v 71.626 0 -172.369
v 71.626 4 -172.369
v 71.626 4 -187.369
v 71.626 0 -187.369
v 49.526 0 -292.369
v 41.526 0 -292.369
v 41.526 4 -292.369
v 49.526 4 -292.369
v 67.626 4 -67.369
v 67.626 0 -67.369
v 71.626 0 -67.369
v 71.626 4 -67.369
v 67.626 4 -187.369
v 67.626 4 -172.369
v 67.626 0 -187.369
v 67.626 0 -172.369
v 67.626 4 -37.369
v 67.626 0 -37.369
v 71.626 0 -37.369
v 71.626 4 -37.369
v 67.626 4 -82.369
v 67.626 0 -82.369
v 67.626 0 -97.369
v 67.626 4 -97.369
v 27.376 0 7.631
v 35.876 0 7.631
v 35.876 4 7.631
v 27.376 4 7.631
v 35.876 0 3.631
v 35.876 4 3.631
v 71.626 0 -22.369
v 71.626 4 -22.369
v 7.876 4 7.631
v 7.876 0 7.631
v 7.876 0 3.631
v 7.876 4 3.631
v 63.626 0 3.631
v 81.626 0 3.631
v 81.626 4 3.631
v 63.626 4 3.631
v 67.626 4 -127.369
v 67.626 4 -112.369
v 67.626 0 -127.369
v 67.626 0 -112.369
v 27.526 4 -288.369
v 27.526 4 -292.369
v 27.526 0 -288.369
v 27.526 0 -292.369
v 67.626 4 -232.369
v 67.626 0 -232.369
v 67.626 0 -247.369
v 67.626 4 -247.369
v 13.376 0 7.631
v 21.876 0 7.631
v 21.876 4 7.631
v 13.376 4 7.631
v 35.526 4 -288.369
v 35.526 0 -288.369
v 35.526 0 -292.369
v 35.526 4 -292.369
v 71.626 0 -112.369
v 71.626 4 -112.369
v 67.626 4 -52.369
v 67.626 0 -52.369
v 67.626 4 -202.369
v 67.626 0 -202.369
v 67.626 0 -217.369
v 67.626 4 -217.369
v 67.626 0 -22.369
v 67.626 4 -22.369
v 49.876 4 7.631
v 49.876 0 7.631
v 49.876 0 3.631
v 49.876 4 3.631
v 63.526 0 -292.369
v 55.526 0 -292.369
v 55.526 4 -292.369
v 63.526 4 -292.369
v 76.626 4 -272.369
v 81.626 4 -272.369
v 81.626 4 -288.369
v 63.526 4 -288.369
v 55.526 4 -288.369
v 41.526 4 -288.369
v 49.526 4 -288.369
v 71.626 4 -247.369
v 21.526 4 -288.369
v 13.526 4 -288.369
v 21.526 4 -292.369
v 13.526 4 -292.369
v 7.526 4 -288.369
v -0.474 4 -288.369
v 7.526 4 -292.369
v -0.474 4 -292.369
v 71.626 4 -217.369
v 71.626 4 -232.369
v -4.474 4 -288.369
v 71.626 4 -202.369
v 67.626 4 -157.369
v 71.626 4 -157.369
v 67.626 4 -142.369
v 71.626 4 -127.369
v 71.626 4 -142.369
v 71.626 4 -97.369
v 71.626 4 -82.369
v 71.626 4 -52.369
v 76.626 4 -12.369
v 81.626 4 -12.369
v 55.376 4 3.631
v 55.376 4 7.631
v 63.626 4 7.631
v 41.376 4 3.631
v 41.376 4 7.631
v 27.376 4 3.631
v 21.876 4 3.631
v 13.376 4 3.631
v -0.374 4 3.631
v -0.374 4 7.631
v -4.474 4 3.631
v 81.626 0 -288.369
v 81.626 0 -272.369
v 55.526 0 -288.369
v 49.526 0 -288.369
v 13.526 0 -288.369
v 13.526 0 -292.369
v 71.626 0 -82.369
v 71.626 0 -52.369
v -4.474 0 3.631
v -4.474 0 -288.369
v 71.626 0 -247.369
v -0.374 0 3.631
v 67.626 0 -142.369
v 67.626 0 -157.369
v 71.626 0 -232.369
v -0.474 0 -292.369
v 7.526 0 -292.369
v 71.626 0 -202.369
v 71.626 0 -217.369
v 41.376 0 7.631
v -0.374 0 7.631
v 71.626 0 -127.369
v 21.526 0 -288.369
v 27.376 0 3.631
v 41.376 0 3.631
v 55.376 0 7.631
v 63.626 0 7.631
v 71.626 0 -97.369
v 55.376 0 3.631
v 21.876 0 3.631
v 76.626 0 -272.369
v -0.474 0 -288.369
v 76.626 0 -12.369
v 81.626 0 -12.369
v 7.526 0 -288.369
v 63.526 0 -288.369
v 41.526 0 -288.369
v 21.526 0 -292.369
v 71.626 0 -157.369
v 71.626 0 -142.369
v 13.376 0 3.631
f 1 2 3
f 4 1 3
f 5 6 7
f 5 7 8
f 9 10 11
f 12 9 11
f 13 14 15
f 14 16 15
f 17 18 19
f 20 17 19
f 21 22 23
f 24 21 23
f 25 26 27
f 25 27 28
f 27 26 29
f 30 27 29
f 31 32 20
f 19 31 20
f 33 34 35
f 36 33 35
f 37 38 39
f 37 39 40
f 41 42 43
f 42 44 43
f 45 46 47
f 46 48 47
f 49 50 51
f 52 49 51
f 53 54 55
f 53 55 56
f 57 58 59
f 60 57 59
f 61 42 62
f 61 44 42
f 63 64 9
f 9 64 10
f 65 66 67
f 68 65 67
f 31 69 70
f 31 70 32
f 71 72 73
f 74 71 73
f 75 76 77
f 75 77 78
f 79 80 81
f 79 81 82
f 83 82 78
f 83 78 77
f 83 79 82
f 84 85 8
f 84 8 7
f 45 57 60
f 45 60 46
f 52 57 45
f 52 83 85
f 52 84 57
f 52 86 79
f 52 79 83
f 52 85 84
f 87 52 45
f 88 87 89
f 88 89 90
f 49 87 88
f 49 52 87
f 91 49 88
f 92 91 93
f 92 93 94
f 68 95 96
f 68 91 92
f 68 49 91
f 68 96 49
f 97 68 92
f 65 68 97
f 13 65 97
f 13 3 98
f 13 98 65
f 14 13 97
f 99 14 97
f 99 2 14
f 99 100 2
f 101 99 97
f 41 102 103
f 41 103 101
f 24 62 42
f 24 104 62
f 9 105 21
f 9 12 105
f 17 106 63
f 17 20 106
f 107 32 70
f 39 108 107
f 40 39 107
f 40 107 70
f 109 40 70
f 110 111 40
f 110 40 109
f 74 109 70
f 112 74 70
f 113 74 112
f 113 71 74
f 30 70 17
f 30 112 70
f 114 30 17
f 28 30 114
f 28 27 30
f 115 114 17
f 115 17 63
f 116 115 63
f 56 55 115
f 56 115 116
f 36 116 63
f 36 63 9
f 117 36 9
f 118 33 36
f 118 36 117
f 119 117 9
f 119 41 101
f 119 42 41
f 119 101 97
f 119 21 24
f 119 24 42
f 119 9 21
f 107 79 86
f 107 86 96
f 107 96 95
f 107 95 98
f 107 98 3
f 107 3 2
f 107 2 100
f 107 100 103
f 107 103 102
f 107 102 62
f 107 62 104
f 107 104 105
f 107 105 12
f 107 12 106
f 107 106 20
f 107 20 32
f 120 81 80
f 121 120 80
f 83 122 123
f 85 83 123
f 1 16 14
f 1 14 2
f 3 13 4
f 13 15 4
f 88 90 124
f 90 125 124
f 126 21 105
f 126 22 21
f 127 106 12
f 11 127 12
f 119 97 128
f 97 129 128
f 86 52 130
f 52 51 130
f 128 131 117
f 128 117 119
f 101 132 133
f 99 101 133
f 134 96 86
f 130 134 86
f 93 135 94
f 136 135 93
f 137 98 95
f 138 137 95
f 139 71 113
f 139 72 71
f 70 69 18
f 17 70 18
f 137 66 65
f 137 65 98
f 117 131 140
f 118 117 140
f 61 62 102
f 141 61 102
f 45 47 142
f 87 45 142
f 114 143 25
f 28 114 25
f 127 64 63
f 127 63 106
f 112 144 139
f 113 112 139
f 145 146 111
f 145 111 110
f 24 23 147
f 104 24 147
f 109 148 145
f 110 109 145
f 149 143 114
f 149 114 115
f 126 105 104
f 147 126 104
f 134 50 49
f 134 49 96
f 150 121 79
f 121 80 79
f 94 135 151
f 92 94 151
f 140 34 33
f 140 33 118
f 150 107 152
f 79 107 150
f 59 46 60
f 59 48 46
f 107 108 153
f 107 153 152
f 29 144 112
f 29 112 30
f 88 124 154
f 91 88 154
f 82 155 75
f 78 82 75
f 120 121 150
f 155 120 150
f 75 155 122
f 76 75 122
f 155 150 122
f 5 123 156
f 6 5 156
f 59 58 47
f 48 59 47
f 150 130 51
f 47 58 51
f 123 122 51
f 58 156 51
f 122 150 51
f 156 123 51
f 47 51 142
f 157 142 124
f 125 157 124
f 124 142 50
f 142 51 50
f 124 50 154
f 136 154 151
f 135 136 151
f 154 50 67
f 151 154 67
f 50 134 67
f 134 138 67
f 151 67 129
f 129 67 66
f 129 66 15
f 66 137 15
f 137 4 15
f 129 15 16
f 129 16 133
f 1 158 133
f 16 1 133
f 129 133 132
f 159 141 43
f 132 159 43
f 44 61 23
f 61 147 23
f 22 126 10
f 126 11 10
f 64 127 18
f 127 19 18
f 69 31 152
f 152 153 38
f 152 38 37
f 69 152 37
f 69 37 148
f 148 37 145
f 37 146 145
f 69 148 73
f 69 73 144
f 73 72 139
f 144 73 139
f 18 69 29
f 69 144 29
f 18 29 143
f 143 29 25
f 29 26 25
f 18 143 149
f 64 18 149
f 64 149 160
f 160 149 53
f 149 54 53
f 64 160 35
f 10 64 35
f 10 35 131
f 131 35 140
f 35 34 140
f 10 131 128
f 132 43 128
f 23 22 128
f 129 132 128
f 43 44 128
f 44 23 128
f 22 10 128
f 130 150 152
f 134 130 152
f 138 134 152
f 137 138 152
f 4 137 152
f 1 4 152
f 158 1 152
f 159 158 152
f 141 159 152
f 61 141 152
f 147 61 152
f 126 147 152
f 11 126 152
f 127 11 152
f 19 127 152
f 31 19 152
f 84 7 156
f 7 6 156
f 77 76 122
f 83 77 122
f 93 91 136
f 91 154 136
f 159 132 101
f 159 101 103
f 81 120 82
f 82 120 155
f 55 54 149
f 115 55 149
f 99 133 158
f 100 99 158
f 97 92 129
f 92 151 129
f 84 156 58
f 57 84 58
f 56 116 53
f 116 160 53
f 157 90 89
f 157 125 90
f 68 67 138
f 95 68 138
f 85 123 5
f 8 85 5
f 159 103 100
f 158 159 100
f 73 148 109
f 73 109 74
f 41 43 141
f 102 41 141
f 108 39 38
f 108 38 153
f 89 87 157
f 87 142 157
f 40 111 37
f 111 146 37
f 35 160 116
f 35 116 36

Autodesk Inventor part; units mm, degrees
ref_plane "YZ Plane" through (0, 0, 0) normal (1, 0, 0) x (0, 1, 0)
ref_plane "XZ Plane" through (0, 0, 0) normal (0, 1, 0) x (-1, 0, 0)
ref_plane "XY Plane" through (0, 0, 0) normal (0, 0, 1) x (1, 0, 0)
sketch "Sketch1" plane through (0, 0, 0) normal (0, 1, 0) x (-1, 0, 0)
  line L0 (-71.6259, 7.6308) -> (8.4741, 7.6308)
  line L1 (8.4741, 7.6308) -> (8.4741, -292.3692)
  line L2 (8.4741, -292.3692) -> (-71.6259, -292.3692)
  line L3 (-71.6259, -292.3692) -> (-71.6259, 7.6308)
  point P0 (0, 0)
extrude "Extrusion1" add sketch "Sketch1" along normal blind 4
sketch "Sketch2" plane through (0, 0, 0) normal (0, -1, 0) x (1, 0, 0)
  line L0 (-0.3741, 7.6308) -> (-18.4741, 7.6308) construction
  line L1 (-0.3741, 3.6308) -> (-0.3741, 7.6308) construction
  line L2 (7.6259, 7.6308) -> (7.6259, 3.6308) construction
  line L3 (13.6259, 3.6308) -> (7.6259, 3.6308) construction
  line L4 (13.6259, 3.6308) -> (13.6259, 7.6308) construction
  line L5 (21.6259, 7.6308) -> (21.6259, 3.6308) construction
  line L6 (27.6259, 3.6308) -> (21.6259, 3.6308) construction
  line L7 (27.6259, 3.6308) -> (27.6259, 7.6308) construction
  line L8 (35.6259, 7.6308) -> (35.6259, 3.6308) construction
  line L9 (41.6259, 3.6308) -> (35.6259, 3.6308) construction
  line L10 (41.6259, 3.6308) -> (41.6259, 7.6308) construction
  line L11 (49.6259, 7.6308) -> (49.6259, 3.6308) construction
  line L12 (55.6259, 3.6308) -> (49.6259, 3.6308) construction
  line L13 (55.6259, 3.6308) -> (55.6259, 7.6308) construction
  line L14 (63.6259, 7.6308) -> (63.6259, 3.6308) construction
  line L15 (71.6259, 3.6308) -> (63.6259, 3.6308) construction
  line L16 (67.6259, 3.6308) -> (67.6259, -7.3692) projected
  line L17 (67.6259, -7.3692) -> (71.6259, -7.3692) projected
  line L18 (71.6259, 3.6308) -> (71.6259, -7.3692) projected
  line L19 (67.6259, 3.6308) -> (71.6259, 3.6308) projected
  line L20 (67.6259, -22.3692) -> (67.6259, -37.3692) projected
  line L21 (67.6259, -37.3692) -> (71.6259, -37.3692) projected
  line L22 (71.6259, -22.3692) -> (71.6259, -37.3692) projected
  line L23 (67.6259, -22.3692) -> (71.6259, -22.3692) projected
  line L24 (67.6259, -52.3692) -> (67.6259, -67.3692) projected
  line L25 (67.6259, -67.3692) -> (71.6259, -67.3692) projected
  line L26 (71.6259, -52.3692) -> (71.6259, -67.3692) projected
  line L27 (67.6259, -52.3692) -> (71.6259, -52.3692) projected
  line L28 (67.6259, -82.3692) -> (67.6259, -97.3692) projected
  line L29 (67.6259, -97.3692) -> (71.6259, -97.3692) projected
  line L30 (71.6259, -82.3692) -> (71.6259, -97.3692) projected
  line L31 (67.6259, -82.3692) -> (71.6259, -82.3692) projected
  line L32 (67.6259, -112.3692) -> (67.6259, -127.3692) projected
  line L33 (67.6259, -127.3692) -> (71.6259, -127.3692) projected
  line L34 (71.6259, -112.3692) -> (71.6259, -127.3692) projected
  line L35 (67.6259, -112.3692) -> (71.6259, -112.3692) projected
  line L36 (67.6259, -142.3692) -> (67.6259, -157.3692) projected
  line L37 (67.6259, -157.3692) -> (71.6259, -157.3692) projected
  line L38 (71.6259, -142.3692) -> (71.6259, -157.3692) projected
  line L39 (67.6259, -142.3692) -> (71.6259, -142.3692) projected
  line L40 (67.6259, -172.3692) -> (67.6259, -187.3692) projected
  line L41 (67.6259, -187.3692) -> (71.6259, -187.3692) projected
  line L42 (71.6259, -172.3692) -> (71.6259, -187.3692) projected
  line L43 (67.6259, -172.3692) -> (71.6259, -172.3692) projected
  line L44 (67.6259, -202.3692) -> (67.6259, -217.3692) projected
  line L45 (67.6259, -217.3692) -> (71.6259, -217.3692) projected
  line L46 (71.6259, -202.3692) -> (71.6259, -217.3692) projected
  line L47 (67.6259, -202.3692) -> (71.6259, -202.3692) projected
  line L48 (67.6259, -232.3692) -> (67.6259, -247.3692) projected
  line L49 (67.6259, -247.3692) -> (71.6259, -247.3692) projected
  line L50 (71.6259, -232.3692) -> (71.6259, -247.3692) projected
  line L51 (67.6259, -232.3692) -> (71.6259, -232.3692) projected
  line L52 (67.6259, -262.3692) -> (67.6259, -277.3692) projected
  line L53 (67.6259, -277.3692) -> (71.6259, -277.3692) projected
  line L54 (71.6259, -262.3692) -> (71.6259, -277.3692) projected
  line L55 (67.6259, -262.3692) -> (71.6259, -262.3692) projected
  line L56 (71.6259, -288.3692) -> (63.5259, -288.3692) projected
  line L57 (63.5259, -288.3692) -> (63.5259, -292.3692) projected
  line L58 (55.5259, -292.3692) -> (55.5259, -288.3692) projected
  line L59 (55.5259, -288.3692) -> (49.5259, -288.3692) projected
  line L60 (49.5259, -288.3692) -> (49.5259, -292.3692) projected
  line L61 (41.5259, -288.3692) -> (35.5259, -288.3692) projected
  line L62 (41.5259, -292.3692) -> (41.5259, -288.3692) projected
  line L63 (35.5259, -288.3692) -> (35.5259, -292.3692) projected
  line L64 (27.5259, -288.3692) -> (21.5259, -288.3692) projected
  line L65 (27.5259, -292.3692) -> (27.5259, -288.3692) projected
  line L66 (21.5259, -288.3692) -> (21.5259, -292.3692) projected
  line L67 (13.5259, -288.3692) -> (7.5259, -288.3692) projected
  line L68 (13.5259, -292.3692) -> (13.5259, -288.3692) projected
  line L69 (7.5259, -288.3692) -> (7.5259, -292.3692) projected
  line L70 (-8.4741, -292.3692) -> (-8.4741, 7.6308) projected
  line L71 (-8.4741, -22.3692) -> (-8.4741, -37.3692) projected
  line L72 (-8.4741, -37.3692) -> (-4.4741, -37.3692) projected
  line L73 (-4.4741, -22.3692) -> (-4.4741, -37.3692) projected
  line L74 (-8.4741, -22.3692) -> (-4.4741, -22.3692) projected
  line L75 (-8.4741, -52.3692) -> (-8.4741, -67.3692) projected
  line L76 (-8.4741, -67.3692) -> (-4.4741, -67.3692) projected
  line L77 (-4.4741, -52.3692) -> (-4.4741, -67.3692) projected
  line L78 (-8.4741, -52.3692) -> (-4.4741, -52.3692) projected
  line L79 (-8.4741, -82.3692) -> (-8.4741, -97.3692) projected
  line L80 (-8.4741, -97.3692) -> (-4.4741, -97.3692) projected
  line L81 (-4.4741, -82.3692) -> (-4.4741, -97.3692) projected
  line L82 (-8.4741, -82.3692) -> (-4.4741, -82.3692) projected
  line L83 (-8.4741, -112.3692) -> (-8.4741, -127.3692) projected
  line L84 (-8.4741, -127.3692) -> (-4.4741, -127.3692) projected
  line L85 (-4.4741, -112.3692) -> (-4.4741, -127.3692) projected
  line L86 (-8.4741, -112.3692) -> (-4.4741, -112.3692) projected
  line L87 (-8.4741, -142.3692) -> (-8.4741, -157.3692) projected
  line L88 (-8.4741, -157.3692) -> (-4.4741, -157.3692) projected
  line L89 (-4.4741, -142.3692) -> (-4.4741, -157.3692) projected
  line L90 (-8.4741, -142.3692) -> (-4.4741, -142.3692) projected
  line L91 (-8.4741, -172.3692) -> (-8.4741, -187.3692) projected
  line L92 (-8.4741, -187.3692) -> (-4.4741, -187.3692) projected
  line L93 (-4.4741, -172.3692) -> (-4.4741, -187.3692) projected
  line L94 (-8.4741, -172.3692) -> (-4.4741, -172.3692) projected
  line L95 (-8.4741, -202.3692) -> (-8.4741, -217.3692) projected
  line L96 (-8.4741, -217.3692) -> (-4.4741, -217.3692) projected
  line L97 (-4.4741, -202.3692) -> (-4.4741, -217.3692) projected
  line L98 (-8.4741, -202.3692) -> (-4.4741, -202.3692) projected
  line L99 (-8.4741, -232.3692) -> (-8.4741, -247.3692) projected
  line L100 (-8.4741, -247.3692) -> (-4.4741, -247.3692) projected
  line L101 (-4.4741, -232.3692) -> (-4.4741, -247.3692) projected
  line L102 (-8.4741, -232.3692) -> (-4.4741, -232.3692) projected
  line L103 (71.6259, -37.1192) -> (67.6259, -37.1192)
  line L104 (67.6259, -22.6192) -> (71.6259, -22.6192)
  line L105 (67.6259, -52.6192) -> (71.6259, -52.6192)
  line L106 (71.6259, -67.1192) -> (67.6259, -67.1192)
  line L107 (67.6259, -82.6192) -> (71.6259, -82.6192)
  line L108 (71.6259, -97.1192) -> (67.6259, -97.1192)
  line L109 (67.6259, -112.6192) -> (71.6259, -112.6192)
  line L110 (71.6259, -127.1192) -> (67.6259, -127.1192)
  line L111 (67.6259, -142.6192) -> (71.6259, -142.6192)
  line L112 (71.6259, -157.1192) -> (67.6259, -157.1192)
  line L113 (67.6259, -172.6192) -> (71.6259, -172.6192)
  line L114 (71.6259, -187.1192) -> (67.6259, -187.1192)
  line L115 (67.6259, -202.6192) -> (71.6259, -202.6192)
  line L116 (71.6259, -217.1192) -> (67.6259, -217.1192)
  line L117 (67.6259, -232.6192) -> (71.6259, -232.6192)
  line L118 (71.6259, -247.1192) -> (67.6259, -247.1192)
  line L119 (67.6259, -262.6192) -> (71.6259, -262.6192)
  line L120 (71.6259, -277.1192) -> (67.6259, -277.1192)
  line L121 (-4.4741, -22.6192) -> (-8.4741, -22.6192)
  line L122 (-4.4741, -37.1192) -> (-8.4741, -37.1192)
  line L123 (-4.4741, -52.6192) -> (-8.4741, -52.6192)
  line L124 (-4.4741, -67.1192) -> (-8.4741, -67.1192)
  line L125 (-4.4741, -82.6192) -> (-8.4741, -82.6192)
  line L126 (-4.4741, -97.1192) -> (-8.4741, -97.1192)
  line L127 (-4.4741, -112.6192) -> (-8.4741, -112.6192)
  line L128 (-4.4741, -127.1192) -> (-8.4741, -127.1192)
  line L129 (-4.4741, -142.6192) -> (-8.4741, -142.6192)
  line L130 (-4.4741, -157.1192) -> (-8.4741, -157.1192)
  line L131 (-4.4741, -172.6192) -> (-8.4741, -172.6192)
  line L132 (-4.4741, -187.1192) -> (-8.4741, -187.1192)
  line L133 (-4.4741, -202.6192) -> (-8.4741, -202.6192)
  line L134 (-4.4741, -217.1192) -> (-8.4741, -217.1192)
  line L135 (-4.4741, -232.6192) -> (-8.4741, -232.6192)
  line L136 (-4.4741, -247.1192) -> (-8.4741, -247.1192)
  line L137 (7.8759, 7.6308) -> (7.8759, 3.6308)
  line L138 (13.3759, 3.6308) -> (13.3759, 7.6308)
  line L139 (21.8759, 7.6308) -> (21.8759, 3.6308)
  line L140 (27.3759, 3.6308) -> (27.3759, 7.6308)
  line L141 (35.8759, 7.6308) -> (35.8759, 3.6308)
  line L142 (41.3759, 3.6308) -> (41.3759, 7.6308)
  line L143 (49.8759, 7.6308) -> (49.8759, 3.6308)
  line L144 (55.3759, 3.6308) -> (55.3759, 7.6308)
  line L145 (7.7759, -292.3692) -> (7.7759, -288.3692)
  line L146 (13.2759, -288.3692) -> (13.2759, -292.3692)
  line L147 (21.7759, -292.3692) -> (21.7759, -288.3692)
  line L148 (27.2759, -288.3692) -> (27.2759, -292.3692)
  line L149 (35.7759, -292.3692) -> (35.7759, -288.3692)
  line L150 (41.2759, -288.3692) -> (41.2759, -292.3692)
  line L151 (49.7759, -292.3692) -> (49.7759, -288.3692)
  line L152 (55.2759, -288.3692) -> (55.2759, -292.3692)
  line L153 (13.6259, 3.6308) -> (7.6259, 3.6308) projected
  line L154 (27.6259, 3.6308) -> (21.6259, 3.6308) projected
  line L155 (41.6259, 3.6308) -> (35.6259, 3.6308) projected
  line L156 (55.6259, 3.6308) -> (49.6259, 3.6308) projected
  line L157 (71.6259, -292.3692) -> (-8.4741, -292.3692) projected
  line L158 (-0.3741, 3.6308) -> (-0.3741, 7.6308) projected
  line L159 (-8.4741, 7.6308) -> (71.6259, 7.6308) projected
  line L160 (71.6259, 7.6308) -> (71.6259, -292.3692) projected
  line L161 (63.6259, 7.6308) -> (63.6259, 3.6308) projected
  line L162 (71.6259, 3.6308) -> (63.6259, 3.6308) projected
  line L163 (-0.3741, 3.6308) -> (-18.4741, 3.6308) projected
  line L164 (-18.4741, 7.6308) -> (-18.4741, 3.6308) projected
  line L165 (-0.3741, 7.6308) -> (-18.4741, 7.6308) projected
  line L166 (-0.3741, 3.6308) -> (-0.3741, 7.6308) projected
  line L167 (-0.3741, 7.6308) -> (-18.4741, 7.6308) projected
  line L168 (-18.4741, 7.6308) -> (-18.4741, 3.6308) projected
  line L169 (-0.3741, 3.6308) -> (-18.4741, 3.6308) projected
  line L170 (-0.4741, -292.3692) -> (-0.4741, -288.3692) projected
  line L171 (-0.4741, -288.3692) -> (-18.4741, -288.3692) projected
  line L172 (-18.4741, -292.3692) -> (-18.4741, -288.3692) projected
  line L173 (-0.4741, -292.3692) -> (-18.4741, -292.3692) projected
  line L174 (18.1084, -192.1281) -> (2.6152, -192.1281)
  line L175 (2.6152, -192.1281) -> (2.6152, -222.247)
  line L176 (2.6152, -222.247) -> (18.1084, -222.247)
  line L177 (18.1084, -222.247) -> (18.1084, -192.1281)
  line L178 (-8.4741, -7.3692) -> (-4.4741, -7.3692)
  line L179 (-4.4741, -7.3692) -> (-4.4741, 7.6308)
  line L180 (-4.4741, 7.6308) -> (-8.4741, 7.6308)
  line L181 (-8.4741, 7.6308) -> (-8.4741, -7.3692)
  line L182 (-8.4741, -262.3692) -> (-4.4741, -262.3692)
  line L183 (-4.4741, -52.6192) -> (-4.4741, -288.3692)
  line L184 (-4.4741, -277.3692) -> (-8.4741, -277.3692)
  line L185 (-8.4741, -277.3692) -> (-8.4741, -262.3692)
  line L186 (-4.4741, -52.6192) -> (-4.4741, -7.3692)
  point P0 (0, 0)
  point P1 (-4.4741, -247.1192)
  point P2 (-4.4741, -232.6192)
  point P3 (-4.4741, -217.1192)
  point P4 (-4.4741, -202.6192)
  point P5 (-4.4741, -187.1192)
  point P6 (-4.4741, -172.6192)
  point P7 (-4.4741, -157.1192)
  point P8 (-4.4741, -142.6192)
  point P9 (-4.4741, -127.1192)
  point P10 (-4.4741, -112.6192)
  point P11 (-4.4741, -97.1192)
  point P12 (-4.4741, -82.6192)
  point P13 (-4.4741, -67.1192)
  point P14 (-4.4741, -52.6192)
  point P15 (-4.4741, 3.6308)
  point P16 (-8.4741, 3.6308)
  point P17 (-8.4741, -288.3692)
  dimension "d4" = 0.25
  dimension "d7" = 30
  dimension "d12" = 0.25
  dimension "d15" = 30
  dimension "d20" = 0.25
  dimension "d23" = 14
  dimension "d28" = 0.25
  dimension "d31" = 14
  dimension "d46" = 4
  dimension "d47" = 15
  dimension "d48" = 30
  dimension "d49" = 30
extrude "Extrusion2" cut sketch "Sketch2" against normal through all contours L19 L18 L17 L16 | L162 L161 L159 L160 L19 | L22 L104 L20 L23 | L144 L156 L143 L159 | L22 L103 L20 L104 | L22 L21 L20 L103 | L142 L155 L141 L159 | L26 L105 L24 L27 | L140 L154 L139 L159 | L26 L106 L24 L105 | L26 L25 L24 L106 | L138 L153 L137 L159 | L30 L107 L28 L31 | L158 L163 L179 L159 | L30 L108 L28 L107 | L179 L163 L70 L159 | L30 L29 L28 L108 | L179 L178 L70 L163 | L70 L163 L164 L165 | L186 L74 L70 L178 | L34 L109 L32 L35 | L73 L121 L70 L74 | L34 L110 L32 L109 | L73 L122 L70 L121 | L34 L33 L32 L110 | L73 L72 L70 L122 | L186 L78 L70 L72 | L38 L111 L36 L39 | L77 L123 L70 L78 | L38 L112 L36 L111 | L77 L124 L70 L123 | L38 L37 L36 L112 | L77 L76 L70 L124 | L183 L82 L70 L76 | L42 L113 L40 L43 | L81 L125 L70 L82 | L42 L114 L40 L113 | L81 L126 L70 L125 | L42 L41 L40 L114 | L81 L80 L70 L126 | L183 L86 L70 L80 | L46 L115 L44 L47 | L85 L127 L70 L86 | L46 L116 L44 L115 | L85 L128 L70 L127 | L46 L45 L44 L116 | L85 L84 L70 L128 | L183 L90 L70 L84 | L50 L117 L48 L51 | L89 L129 L70 L90 | L50 L118 L48 L117 | L89 L130 L70 L129 | L50 L49 L48 L118 | L89 L88 L70 L130 | L183 L94 L70 L88 | L54 L119 L52 L55 | L93 L131 L70 L94 | L54 L120 L52 L119 | L93 L132 L70 L131 | L54 L53 L52 L120 | L93 L92 L70 L132 | L183 L98 L70 L92 | L160 L157 L57 L56 | L97 L133 L70 L98 | L97 L134 L70 L133 | L97 L96 L70 L134 | L157 L152 L59 L58 | L183 L102 L70 L96 | L157 L151 L59 L152 | L101 L135 L70 L102 | L157 L60 L59 L151 | L101 L136 L70 L135 | L101 L100 L70 L136 | L157 L150 L61 L62 | L183 L182 L70 L100 | L157 L149 L61 L150 | L183 L184 L70 L182 | L157 L63 L61 L149 | L183 L171 L70 L184 | L171 L170 L157 L70 | L157 L148 L64 L65 | L70 L173 L172 L171 | L157 L147 L64 L148 | L157 L66 L64 L147 | L69 L67 L145 L157 | L145 L67 L146 L157 | L157 L146 L67 L68
sketch "Sketch4" plane through (0, 4, 0) normal (0, 1, 0) x (1, 0, 0)
  line L0 (67.6259, 7.3692) -> (67.6259, -3.6308) projected
  line L1 (67.6259, -3.6308) -> (81.6259, -3.6308)
  line L2 (81.6259, -3.6308) -> (81.6259, 12.3692)
  line L3 (81.6259, 12.3692) -> (67.6259, 12.3692)
  line L4 (67.6259, 12.3692) -> (67.6259, -3.6308)
  line L5 (81.6259, -7.6308) -> (81.6259, -3.6308)
  line L6 (55.3759, -7.6308) -> (63.6259, -7.6308) projected
  line L7 (63.5259, 288.3692) -> (71.6259, 288.3692) projected
  line L8 (66.2844, 288.3692) -> (81.6259, 288.3692)
  line L9 (81.6259, 288.3692) -> (81.6259, 272.3692)
  line L10 (81.6259, 272.3692) -> (66.2844, 272.3692)
  line L11 (66.2844, 272.3692) -> (66.2844, 288.3692)
  line L12 (63.5259, 292.3692) -> (81.6259, 292.3692)
  line L13 (67.6259, 262.3692) -> (67.6259, 277.3692) projected
  line L14 (71.6259, 262.1619) -> (67.6259, 262.1619)
  line L15 (67.6259, 262.1619) -> (67.6259, 277.3692)
  line L16 (67.6259, 277.3692) -> (71.6259, 277.3692)
  line L17 (71.6259, 277.3692) -> (71.6259, 22.3692)
  line L18 (76.6259, 12.3692) -> (76.6259, 272.3692)
  line L19 (71.6259, 277.3692) -> (71.6259, 288.3692) projected
  line L20 (-0.4741, 292.3692) -> (-0.4741, 288.3692) projected
  line L21 (-0.4741, 288.3692) -> (-4.4741, 288.3692) projected
  line L22 (-4.4741, 288.3692) -> (-4.4741, -3.6308) projected
  line L23 (-4.4741, -3.6308) -> (-0.3741, -3.6308) projected
  line L24 (-0.3741, -3.6308) -> (-0.3741, -7.6308) projected
  line L25 (-0.3741, -7.6308) -> (7.8759, -7.6308) projected
  line L26 (7.8759, -7.6308) -> (7.8759, -3.6308) projected
  line L27 (7.8759, -3.6308) -> (13.3759, -3.6308) projected
  line L28 (13.3759, -3.6308) -> (13.3759, -7.6308) projected
  line L29 (13.3759, -7.6308) -> (21.8759, -7.6308) projected
  line L30 (21.8759, -7.6308) -> (21.8759, -3.6308) projected
  line L31 (21.8759, -3.6308) -> (27.3759, -3.6308) projected
  line L32 (27.3759, -3.6308) -> (27.3759, -7.6308) projected
  line L33 (27.3759, -7.6308) -> (35.8759, -7.6308) projected
  line L34 (35.8759, -7.6308) -> (35.8759, -3.6308) projected
  line L35 (35.8759, -3.6308) -> (41.3759, -3.6308) projected
  line L36 (41.3759, -3.6308) -> (41.3759, -7.6308) projected
  line L37 (41.3759, -7.6308) -> (49.8759, -7.6308) projected
  line L38 (49.8759, -7.6308) -> (49.8759, -3.6308) projected
  line L39 (49.8759, -3.6308) -> (55.3759, -3.6308) projected
  line L40 (55.3759, -3.6308) -> (55.3759, -7.6308) projected
  line L41 (55.3759, -7.6308) -> (63.6259, -7.6308) projected
  line L42 (63.6259, -7.6308) -> (63.6259, -3.6308) projected
  line L43 (63.6259, -3.6308) -> (67.6259, -3.6308) projected
  line L44 (67.6259, -3.6308) -> (67.6259, 7.3692) projected
  line L45 (67.6259, 7.3692) -> (71.6259, 7.3692) projected
  line L46 (71.6259, 7.3692) -> (71.6259, 22.3692) projected
  line L47 (71.6259, 22.3692) -> (67.6259, 22.3692) projected
  line L48 (67.6259, 22.3692) -> (67.6259, 37.3692) projected
  line L49 (67.6259, 37.3692) -> (71.6259, 37.3692) projected
  line L50 (71.6259, 37.3692) -> (71.6259, 52.3692) projected
  line L51 (71.6259, 52.3692) -> (67.6259, 52.3692) projected
  line L52 (67.6259, 52.3692) -> (67.6259, 67.3692) projected
  line L53 (67.6259, 67.3692) -> (71.6259, 67.3692) projected
  line L54 (71.6259, 67.3692) -> (71.6259, 82.3692) projected
  line L55 (71.6259, 82.3692) -> (67.6259, 82.3692) projected
  line L56 (67.6259, 82.3692) -> (67.6259, 97.3692) projected
  line L57 (67.6259, 97.3692) -> (71.6259, 97.3692) projected
  line L58 (71.6259, 97.3692) -> (71.6259, 112.3692) projected
  line L59 (71.6259, 112.3692) -> (67.6259, 112.3692) projected
  line L60 (67.6259, 112.3692) -> (67.6259, 127.3692) projected
  line L61 (67.6259, 127.3692) -> (71.6259, 127.3692) projected
  line L62 (71.6259, 127.3692) -> (71.6259, 142.3692) projected
  line L63 (71.6259, 142.3692) -> (67.6259, 142.3692) projected
  line L64 (67.6259, 142.3692) -> (67.6259, 157.3692) projected
  line L65 (67.6259, 157.3692) -> (71.6259, 157.3692) projected
  line L66 (71.6259, 157.3692) -> (71.6259, 172.3692) projected
  line L67 (71.6259, 172.3692) -> (67.6259, 172.3692) projected
  line L68 (67.6259, 172.3692) -> (67.6259, 187.3692) projected
  line L69 (67.6259, 187.3692) -> (71.6259, 187.3692) projected
  line L70 (71.6259, 187.3692) -> (71.6259, 202.3692) projected
  line L71 (71.6259, 202.3692) -> (67.6259, 202.3692) projected
  line L72 (67.6259, 202.3692) -> (67.6259, 217.3692) projected
  line L73 (67.6259, 217.3692) -> (71.6259, 217.3692) projected
  line L74 (71.6259, 217.3692) -> (71.6259, 232.3692) projected
  line L75 (71.6259, 232.3692) -> (67.6259, 232.3692) projected
  line L76 (67.6259, 232.3692) -> (67.6259, 247.3692) projected
  line L77 (67.6259, 247.3692) -> (71.6259, 247.3692) projected
  line L78 (71.6259, 247.3692) -> (71.6259, 262.3692) projected
  line L79 (71.6259, 262.3692) -> (67.6259, 262.3692) projected
  line L80 (67.6259, 262.3692) -> (67.6259, 277.3692) projected
  line L81 (67.6259, 277.3692) -> (71.6259, 277.3692) projected
  line L82 (71.6259, 277.3692) -> (71.6259, 288.3692) projected
  line L83 (71.6259, 288.3692) -> (63.5259, 288.3692) projected
  line L84 (63.5259, 288.3692) -> (63.5259, 292.3692) projected
  line L85 (63.5259, 292.3692) -> (55.5259, 292.3692) projected
  line L86 (55.5259, 292.3692) -> (55.5259, 288.3692) projected
  line L87 (55.5259, 288.3692) -> (49.5259, 288.3692) projected
  line L88 (49.5259, 288.3692) -> (49.5259, 292.3692) projected
  line L89 (49.5259, 292.3692) -> (41.5259, 292.3692) projected
  line L90 (41.5259, 292.3692) -> (41.5259, 288.3692) projected
  line L91 (41.5259, 288.3692) -> (35.5259, 288.3692) projected
  line L92 (35.5259, 288.3692) -> (35.5259, 292.3692) projected
  line L93 (35.5259, 292.3692) -> (27.5259, 292.3692) projected
  line L94 (27.5259, 292.3692) -> (27.5259, 288.3692) projected
  line L95 (27.5259, 288.3692) -> (21.5259, 288.3692) projected
  line L96 (21.5259, 288.3692) -> (21.5259, 292.3692) projected
  line L97 (21.5259, 292.3692) -> (13.5259, 292.3692) projected
  line L98 (13.5259, 292.3692) -> (13.5259, 288.3692) projected
  line L99 (13.5259, 288.3692) -> (7.5259, 288.3692) projected
  line L100 (7.5259, 288.3692) -> (7.5259, 292.3692) projected
  line L101 (7.5259, 292.3692) -> (-0.4741, 292.3692) projected
  point P0 (0, 0)
  point P1 (71.6259, 272.3692)
  point P2 (67.6259, 272.3692)
  point P3 (71.6259, 12.3692)
  dimension "d50" = 20
  dimension "d51" = 20
  dimension "d54" = 5
extrude "Extrusion4" add sketch "Sketch4" against normal up to surface (4 mm away) contours L45 L46 L3 L2 L1 L0 | L4 L3 L46 L45 | L46 L17 L10 L18 L3 | L10 L17 L19 L8 L9 | L17 L79 L13 L10 | L10 L13 L16 L17 | L10 L11 L7 L19 L16 L13 | L17 L14 L15 L79
equation "\"d12\" = d4"
properties part number "back"
